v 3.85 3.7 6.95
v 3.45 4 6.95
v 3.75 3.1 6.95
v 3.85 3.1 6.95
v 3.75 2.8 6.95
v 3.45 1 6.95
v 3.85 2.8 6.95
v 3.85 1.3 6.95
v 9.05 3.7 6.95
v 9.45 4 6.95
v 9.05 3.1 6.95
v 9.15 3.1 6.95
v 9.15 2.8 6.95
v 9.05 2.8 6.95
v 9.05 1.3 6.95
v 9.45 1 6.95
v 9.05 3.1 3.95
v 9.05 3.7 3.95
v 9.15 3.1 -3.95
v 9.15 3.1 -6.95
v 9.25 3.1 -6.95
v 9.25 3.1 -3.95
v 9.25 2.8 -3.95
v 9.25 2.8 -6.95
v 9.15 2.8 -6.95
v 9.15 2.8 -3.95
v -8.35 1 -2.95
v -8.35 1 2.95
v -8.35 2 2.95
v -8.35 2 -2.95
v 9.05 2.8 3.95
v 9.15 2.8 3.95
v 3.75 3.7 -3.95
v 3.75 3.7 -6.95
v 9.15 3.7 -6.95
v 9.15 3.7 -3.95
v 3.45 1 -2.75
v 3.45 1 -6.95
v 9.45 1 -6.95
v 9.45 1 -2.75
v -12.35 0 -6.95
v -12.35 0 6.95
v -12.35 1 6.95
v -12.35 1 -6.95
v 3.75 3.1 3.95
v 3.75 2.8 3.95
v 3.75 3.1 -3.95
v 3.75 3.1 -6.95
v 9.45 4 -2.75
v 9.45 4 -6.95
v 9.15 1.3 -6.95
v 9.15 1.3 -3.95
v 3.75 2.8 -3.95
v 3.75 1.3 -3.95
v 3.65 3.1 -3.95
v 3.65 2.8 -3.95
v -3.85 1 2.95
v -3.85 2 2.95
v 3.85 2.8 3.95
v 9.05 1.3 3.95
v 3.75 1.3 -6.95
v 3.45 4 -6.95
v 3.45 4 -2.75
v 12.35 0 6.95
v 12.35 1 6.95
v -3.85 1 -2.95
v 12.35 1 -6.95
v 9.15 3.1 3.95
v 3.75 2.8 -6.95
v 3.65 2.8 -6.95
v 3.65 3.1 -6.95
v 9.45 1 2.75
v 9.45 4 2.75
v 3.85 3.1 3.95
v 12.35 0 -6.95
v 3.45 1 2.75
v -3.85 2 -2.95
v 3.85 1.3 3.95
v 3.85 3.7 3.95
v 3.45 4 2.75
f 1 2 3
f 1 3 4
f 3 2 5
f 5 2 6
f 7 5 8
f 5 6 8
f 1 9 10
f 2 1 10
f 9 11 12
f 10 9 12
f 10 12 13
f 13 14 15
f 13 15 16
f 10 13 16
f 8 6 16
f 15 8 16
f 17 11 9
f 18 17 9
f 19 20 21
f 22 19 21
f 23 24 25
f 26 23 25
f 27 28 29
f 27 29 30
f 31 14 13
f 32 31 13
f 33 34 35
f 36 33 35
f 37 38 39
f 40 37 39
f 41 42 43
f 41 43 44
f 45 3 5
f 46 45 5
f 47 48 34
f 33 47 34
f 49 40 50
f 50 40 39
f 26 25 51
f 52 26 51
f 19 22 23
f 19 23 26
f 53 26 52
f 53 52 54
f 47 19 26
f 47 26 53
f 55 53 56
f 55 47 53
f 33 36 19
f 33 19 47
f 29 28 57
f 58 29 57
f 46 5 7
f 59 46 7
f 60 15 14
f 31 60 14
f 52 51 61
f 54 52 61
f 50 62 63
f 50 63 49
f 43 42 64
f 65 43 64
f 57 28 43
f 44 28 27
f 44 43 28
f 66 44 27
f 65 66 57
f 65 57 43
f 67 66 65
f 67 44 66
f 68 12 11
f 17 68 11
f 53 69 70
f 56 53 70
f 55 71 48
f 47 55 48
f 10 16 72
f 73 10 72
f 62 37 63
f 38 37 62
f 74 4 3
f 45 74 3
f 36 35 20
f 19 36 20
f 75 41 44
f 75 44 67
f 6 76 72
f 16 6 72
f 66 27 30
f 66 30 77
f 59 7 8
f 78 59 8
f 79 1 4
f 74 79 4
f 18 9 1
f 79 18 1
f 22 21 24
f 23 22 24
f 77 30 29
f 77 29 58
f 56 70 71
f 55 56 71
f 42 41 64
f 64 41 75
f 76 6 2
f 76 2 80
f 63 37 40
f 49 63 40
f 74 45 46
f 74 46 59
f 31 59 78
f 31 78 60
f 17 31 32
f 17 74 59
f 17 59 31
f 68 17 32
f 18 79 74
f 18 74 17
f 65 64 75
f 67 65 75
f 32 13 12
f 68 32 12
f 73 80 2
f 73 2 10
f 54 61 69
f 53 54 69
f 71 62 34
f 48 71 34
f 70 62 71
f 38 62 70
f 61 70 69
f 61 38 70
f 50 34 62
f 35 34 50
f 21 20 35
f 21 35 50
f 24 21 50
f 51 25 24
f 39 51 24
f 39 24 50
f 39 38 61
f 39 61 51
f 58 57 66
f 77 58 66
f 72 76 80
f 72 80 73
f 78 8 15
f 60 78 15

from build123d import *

# Parameters (mm, degrees)
SKETCH1_W             = 24.7
SKETCH1_H             = 13.9
BOSS_EXTRUDE1_DEPTH   = 1
SKETCH2_W             = 6
SKETCH2_H             = 4.2
BOSS_EXTRUDE2_DEPTH   = 3
BOSS_EXTRUDE2_2_DEPTH = 3
CUT_EXTRUDE1_DEPTH    = 3
CUT_EXTRUDE2_DEPTH    = 3
SKETCH6_W             = 4.5
SKETCH6_H             = 5.9
BOSS_EXTRUDE3_DEPTH   = 1


with BuildPart() as part:
    # Sketch1 → Boss-Extrude1 (new body)
    with BuildSketch(Plane(origin=(0, 0, 0), x_dir=(1, 0, 0), z_dir=(0, 1, 0))):
        Rectangle(SKETCH1_W, SKETCH1_H)
    extrude(amount=BOSS_EXTRUDE1_DEPTH)

    # Sketch6 → Boss-Extrude3 (add)
    with BuildSketch(Plane(origin=(0, 1, 0), x_dir=(1, 0, 0), z_dir=(0, 1, 0))):
        with Locations((-6.1, 0)):
            Rectangle(SKETCH6_W, SKETCH6_H)
    extrude(amount=BOSS_EXTRUDE3_DEPTH)


with BuildPart() as body_2:
    # Sketch2 → Boss-Extrude2 (new body)
    with BuildSketch(Plane(origin=(0, 1, 0), x_dir=(1, 0, 0), z_dir=(0, 1, 0))):
        with Locations((6.45, -4.85)):
            Rectangle(SKETCH2_W, SKETCH2_H)
    extrude(amount=BOSS_EXTRUDE2_DEPTH)

    # Sketch3 → Cut-Extrude1 (cut)
    with BuildSketch(Plane.XY.offset(6.95)):
        Polygon((3.85, 3.7), (3.85, 3.1), (3.75, 3.1), (3.75, 2.8), (3.85, 2.8), (3.85, 1.3), (9.05, 1.3), (9.05, 2.8), (9.15, 2.8), (9.15, 3.1), (9.05, 3.1), (9.05, 3.7), align=None)
    extrude(amount=-CUT_EXTRUDE1_DEPTH, mode=Mode.SUBTRACT)


with BuildPart() as body_3:
    # Sketch2 → Boss-Extrude2 2 (new body)
    with BuildSketch(Plane(origin=(0, 1, 0), x_dir=(1, 0, 0), z_dir=(0, 1, 0))):
        with Locations((6.45, 4.85)):
            Rectangle(SKETCH2_W, SKETCH2_H)
    extrude(amount=BOSS_EXTRUDE2_2_DEPTH)

    # Sketch5 → Cut-Extrude2 (cut)
    with BuildSketch(Plane(origin=(0, 0, -6.95), x_dir=(-1, 0, 0), z_dir=(0, 0, -1))):
        Polygon((-9.15, 3.7), (-9.15, 3.1), (-9.25, 3.1), (-9.25, 2.8), (-9.15, 2.8), (-9.15, 1.3), (-3.75, 1.3), (-3.75, 2.8), (-3.65, 2.8), (-3.65, 3.1), (-3.75, 3.1), (-3.75, 3.7), align=None)
    extrude(amount=-CUT_EXTRUDE2_DEPTH, mode=Mode.SUBTRACT)


solid = Compound([part.part, body_2.part, body_3.part])
